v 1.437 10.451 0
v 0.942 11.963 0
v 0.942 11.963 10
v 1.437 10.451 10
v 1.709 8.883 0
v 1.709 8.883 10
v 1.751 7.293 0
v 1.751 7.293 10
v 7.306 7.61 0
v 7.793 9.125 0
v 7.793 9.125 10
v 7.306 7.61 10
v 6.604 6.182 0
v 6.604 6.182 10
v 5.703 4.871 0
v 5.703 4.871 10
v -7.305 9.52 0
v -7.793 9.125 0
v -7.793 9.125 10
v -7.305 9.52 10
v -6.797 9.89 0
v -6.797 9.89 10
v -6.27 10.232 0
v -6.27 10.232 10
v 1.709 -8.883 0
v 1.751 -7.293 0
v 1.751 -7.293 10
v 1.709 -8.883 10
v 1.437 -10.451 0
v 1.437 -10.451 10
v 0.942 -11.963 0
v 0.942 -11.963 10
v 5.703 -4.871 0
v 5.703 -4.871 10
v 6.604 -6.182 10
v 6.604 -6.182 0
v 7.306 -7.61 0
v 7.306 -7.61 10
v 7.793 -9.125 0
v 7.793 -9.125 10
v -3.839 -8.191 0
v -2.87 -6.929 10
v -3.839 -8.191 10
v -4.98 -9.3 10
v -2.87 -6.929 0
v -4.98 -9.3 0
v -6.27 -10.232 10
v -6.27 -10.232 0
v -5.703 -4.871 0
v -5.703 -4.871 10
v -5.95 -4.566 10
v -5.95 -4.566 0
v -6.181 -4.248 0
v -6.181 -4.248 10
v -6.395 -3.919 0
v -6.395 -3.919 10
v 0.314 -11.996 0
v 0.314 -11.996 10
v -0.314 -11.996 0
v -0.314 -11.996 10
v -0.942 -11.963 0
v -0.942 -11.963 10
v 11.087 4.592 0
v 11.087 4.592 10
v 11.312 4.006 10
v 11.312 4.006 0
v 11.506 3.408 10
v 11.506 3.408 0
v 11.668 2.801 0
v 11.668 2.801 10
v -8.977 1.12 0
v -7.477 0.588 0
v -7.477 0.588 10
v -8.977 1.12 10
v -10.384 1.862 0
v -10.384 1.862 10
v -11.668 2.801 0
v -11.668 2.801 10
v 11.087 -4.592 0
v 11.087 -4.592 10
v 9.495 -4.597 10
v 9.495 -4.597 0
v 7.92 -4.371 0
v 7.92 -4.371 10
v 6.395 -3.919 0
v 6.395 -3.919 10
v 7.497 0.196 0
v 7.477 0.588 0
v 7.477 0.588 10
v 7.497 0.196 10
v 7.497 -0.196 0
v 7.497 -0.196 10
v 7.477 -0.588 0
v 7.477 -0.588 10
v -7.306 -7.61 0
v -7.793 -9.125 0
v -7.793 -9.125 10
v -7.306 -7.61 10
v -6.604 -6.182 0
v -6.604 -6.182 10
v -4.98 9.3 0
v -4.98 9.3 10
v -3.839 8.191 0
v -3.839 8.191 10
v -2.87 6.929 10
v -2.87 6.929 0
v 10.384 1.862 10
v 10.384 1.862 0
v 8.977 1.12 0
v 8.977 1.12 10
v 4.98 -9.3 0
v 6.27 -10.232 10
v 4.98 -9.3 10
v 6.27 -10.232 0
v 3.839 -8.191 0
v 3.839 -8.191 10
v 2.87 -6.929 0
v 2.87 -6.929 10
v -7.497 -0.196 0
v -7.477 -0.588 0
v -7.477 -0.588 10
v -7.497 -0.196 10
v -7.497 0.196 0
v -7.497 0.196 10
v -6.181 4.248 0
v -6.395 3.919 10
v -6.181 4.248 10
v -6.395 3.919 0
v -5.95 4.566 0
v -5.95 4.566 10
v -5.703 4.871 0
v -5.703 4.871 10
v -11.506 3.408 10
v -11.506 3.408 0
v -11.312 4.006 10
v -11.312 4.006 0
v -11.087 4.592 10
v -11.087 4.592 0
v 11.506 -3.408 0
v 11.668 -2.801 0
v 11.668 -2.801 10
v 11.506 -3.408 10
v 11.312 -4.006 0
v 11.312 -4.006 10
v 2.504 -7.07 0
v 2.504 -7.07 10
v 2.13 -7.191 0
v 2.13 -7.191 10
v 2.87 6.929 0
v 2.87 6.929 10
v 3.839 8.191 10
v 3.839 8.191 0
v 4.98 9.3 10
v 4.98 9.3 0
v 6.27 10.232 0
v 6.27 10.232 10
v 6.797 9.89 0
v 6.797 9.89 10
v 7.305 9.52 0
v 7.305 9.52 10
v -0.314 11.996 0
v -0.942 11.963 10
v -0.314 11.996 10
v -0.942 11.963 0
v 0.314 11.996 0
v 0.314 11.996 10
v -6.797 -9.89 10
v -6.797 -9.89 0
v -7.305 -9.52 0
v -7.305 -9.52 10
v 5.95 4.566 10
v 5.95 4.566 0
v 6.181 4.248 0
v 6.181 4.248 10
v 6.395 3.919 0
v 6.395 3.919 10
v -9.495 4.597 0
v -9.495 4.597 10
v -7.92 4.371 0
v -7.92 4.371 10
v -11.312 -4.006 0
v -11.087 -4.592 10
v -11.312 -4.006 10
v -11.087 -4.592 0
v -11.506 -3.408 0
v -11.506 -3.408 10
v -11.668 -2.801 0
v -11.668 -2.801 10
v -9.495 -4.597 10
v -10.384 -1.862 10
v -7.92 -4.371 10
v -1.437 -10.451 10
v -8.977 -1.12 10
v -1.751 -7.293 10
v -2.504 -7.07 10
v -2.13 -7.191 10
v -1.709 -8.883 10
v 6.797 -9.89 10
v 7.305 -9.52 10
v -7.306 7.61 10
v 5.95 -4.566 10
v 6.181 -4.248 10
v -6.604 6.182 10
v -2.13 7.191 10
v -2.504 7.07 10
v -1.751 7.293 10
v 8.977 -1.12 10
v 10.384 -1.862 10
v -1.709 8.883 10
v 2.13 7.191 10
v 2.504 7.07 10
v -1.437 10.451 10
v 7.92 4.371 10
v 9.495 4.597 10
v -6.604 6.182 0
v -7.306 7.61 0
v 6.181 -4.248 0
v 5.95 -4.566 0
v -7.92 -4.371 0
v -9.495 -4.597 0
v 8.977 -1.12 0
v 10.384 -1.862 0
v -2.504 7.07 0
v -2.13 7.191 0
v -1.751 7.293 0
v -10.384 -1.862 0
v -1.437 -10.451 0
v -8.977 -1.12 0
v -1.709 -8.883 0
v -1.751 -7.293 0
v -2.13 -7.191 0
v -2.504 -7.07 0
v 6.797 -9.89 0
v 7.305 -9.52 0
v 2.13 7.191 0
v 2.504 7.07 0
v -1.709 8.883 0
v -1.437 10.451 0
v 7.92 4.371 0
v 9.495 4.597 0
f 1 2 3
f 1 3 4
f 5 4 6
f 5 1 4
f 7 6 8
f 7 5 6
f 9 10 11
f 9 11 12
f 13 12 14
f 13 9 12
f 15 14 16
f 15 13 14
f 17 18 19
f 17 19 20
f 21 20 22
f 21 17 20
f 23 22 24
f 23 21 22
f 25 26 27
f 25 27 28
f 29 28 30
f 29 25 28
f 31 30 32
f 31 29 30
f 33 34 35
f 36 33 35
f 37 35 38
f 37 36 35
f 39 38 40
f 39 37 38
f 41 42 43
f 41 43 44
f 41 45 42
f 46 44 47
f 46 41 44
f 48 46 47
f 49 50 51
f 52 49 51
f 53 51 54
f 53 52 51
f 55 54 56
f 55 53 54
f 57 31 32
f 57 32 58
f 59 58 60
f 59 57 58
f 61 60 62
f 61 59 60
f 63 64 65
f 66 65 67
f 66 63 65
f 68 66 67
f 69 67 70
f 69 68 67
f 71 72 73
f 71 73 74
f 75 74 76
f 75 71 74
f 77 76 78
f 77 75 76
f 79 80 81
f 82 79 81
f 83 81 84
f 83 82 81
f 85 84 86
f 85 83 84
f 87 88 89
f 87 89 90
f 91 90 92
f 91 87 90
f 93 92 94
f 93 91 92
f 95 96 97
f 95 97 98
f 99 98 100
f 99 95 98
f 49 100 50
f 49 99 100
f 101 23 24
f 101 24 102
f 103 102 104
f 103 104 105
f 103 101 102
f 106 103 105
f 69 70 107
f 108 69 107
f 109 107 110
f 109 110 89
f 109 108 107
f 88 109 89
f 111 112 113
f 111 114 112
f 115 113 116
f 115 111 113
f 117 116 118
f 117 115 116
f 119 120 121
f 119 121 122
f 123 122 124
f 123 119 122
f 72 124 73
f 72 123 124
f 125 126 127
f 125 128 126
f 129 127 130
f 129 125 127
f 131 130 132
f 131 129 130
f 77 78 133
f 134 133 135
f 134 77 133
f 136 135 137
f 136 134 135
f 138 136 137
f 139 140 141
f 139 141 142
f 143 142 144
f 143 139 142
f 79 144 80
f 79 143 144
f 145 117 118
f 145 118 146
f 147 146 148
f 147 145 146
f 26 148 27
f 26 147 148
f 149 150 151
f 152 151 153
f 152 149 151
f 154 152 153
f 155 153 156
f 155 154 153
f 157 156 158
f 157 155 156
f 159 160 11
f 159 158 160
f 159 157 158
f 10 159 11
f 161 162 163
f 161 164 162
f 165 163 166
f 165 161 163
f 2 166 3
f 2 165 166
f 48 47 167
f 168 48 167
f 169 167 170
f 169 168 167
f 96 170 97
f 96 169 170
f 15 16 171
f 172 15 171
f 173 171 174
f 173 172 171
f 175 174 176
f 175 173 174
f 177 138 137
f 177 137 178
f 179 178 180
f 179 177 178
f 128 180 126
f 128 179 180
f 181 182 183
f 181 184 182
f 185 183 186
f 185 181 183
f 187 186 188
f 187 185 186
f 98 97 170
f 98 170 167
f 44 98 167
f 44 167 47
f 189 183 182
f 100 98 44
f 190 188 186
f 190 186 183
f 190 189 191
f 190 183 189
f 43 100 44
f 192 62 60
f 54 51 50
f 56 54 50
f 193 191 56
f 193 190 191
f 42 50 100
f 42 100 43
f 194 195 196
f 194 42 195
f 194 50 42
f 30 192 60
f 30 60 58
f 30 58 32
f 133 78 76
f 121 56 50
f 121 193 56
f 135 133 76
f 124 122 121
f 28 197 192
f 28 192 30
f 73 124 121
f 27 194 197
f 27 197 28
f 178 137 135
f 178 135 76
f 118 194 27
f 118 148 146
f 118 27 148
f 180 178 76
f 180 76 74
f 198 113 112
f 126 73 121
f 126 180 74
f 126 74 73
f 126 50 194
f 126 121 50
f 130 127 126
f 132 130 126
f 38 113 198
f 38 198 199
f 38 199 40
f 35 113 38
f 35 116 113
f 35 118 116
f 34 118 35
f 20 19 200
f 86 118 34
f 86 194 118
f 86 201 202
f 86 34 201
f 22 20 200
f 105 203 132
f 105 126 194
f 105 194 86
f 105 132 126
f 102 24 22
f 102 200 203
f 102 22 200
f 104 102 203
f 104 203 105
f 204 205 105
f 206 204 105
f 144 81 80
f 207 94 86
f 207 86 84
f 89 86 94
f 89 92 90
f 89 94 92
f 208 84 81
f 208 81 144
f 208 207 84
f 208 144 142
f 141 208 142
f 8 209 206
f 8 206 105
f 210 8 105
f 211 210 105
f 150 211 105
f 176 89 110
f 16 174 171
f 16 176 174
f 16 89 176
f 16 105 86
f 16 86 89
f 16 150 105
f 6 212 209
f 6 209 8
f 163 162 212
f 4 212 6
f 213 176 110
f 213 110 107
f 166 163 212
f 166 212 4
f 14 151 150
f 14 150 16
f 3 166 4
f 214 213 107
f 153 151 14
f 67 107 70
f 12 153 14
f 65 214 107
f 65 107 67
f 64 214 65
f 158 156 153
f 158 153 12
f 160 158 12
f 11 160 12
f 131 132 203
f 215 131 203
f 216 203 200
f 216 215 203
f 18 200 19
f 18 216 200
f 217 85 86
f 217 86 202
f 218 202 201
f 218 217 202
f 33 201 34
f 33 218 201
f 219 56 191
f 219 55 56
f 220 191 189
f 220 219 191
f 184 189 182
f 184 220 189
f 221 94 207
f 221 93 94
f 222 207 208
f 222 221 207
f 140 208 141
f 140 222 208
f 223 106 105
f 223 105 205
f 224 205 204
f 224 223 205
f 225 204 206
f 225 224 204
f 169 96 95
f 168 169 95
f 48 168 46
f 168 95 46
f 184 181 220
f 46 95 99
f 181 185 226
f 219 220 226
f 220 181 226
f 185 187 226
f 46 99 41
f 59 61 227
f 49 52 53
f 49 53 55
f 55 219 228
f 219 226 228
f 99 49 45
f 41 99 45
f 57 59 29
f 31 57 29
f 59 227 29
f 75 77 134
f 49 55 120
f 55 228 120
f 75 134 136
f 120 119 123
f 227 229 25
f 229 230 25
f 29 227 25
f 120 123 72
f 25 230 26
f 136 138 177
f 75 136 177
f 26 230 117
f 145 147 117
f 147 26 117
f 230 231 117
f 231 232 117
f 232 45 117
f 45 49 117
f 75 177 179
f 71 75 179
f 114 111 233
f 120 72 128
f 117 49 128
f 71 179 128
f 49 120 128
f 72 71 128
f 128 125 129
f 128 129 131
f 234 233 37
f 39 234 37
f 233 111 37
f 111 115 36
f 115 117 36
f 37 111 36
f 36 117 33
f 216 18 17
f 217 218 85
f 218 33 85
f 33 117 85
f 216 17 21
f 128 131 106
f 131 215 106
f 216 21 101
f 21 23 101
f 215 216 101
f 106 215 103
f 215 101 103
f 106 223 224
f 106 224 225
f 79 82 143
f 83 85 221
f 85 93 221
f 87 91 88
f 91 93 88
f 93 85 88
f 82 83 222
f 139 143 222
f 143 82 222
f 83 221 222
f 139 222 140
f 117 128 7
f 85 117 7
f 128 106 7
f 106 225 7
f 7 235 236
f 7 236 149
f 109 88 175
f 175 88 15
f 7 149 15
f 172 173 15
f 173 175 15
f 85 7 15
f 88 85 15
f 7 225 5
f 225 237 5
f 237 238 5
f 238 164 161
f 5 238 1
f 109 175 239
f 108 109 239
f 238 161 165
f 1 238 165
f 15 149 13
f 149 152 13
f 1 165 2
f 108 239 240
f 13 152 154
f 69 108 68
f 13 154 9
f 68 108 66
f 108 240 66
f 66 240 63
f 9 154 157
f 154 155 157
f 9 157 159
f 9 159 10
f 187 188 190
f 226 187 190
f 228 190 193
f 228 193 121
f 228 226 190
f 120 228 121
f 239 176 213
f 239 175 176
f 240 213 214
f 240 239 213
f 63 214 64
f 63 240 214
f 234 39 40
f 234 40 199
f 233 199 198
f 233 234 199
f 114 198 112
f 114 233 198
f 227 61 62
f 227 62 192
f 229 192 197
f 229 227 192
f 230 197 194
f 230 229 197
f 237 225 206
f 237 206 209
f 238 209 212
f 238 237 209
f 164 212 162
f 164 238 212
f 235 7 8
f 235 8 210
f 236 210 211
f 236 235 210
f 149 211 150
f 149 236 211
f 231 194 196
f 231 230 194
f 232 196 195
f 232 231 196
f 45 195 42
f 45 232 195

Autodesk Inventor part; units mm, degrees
sketch "Sketch1" plane through (0, 0, 0) normal (0, 0, 1) x (1, 0, 0)
  circle A0 centre (0, 0) radius 12
  dimension "d0" = 24
extrude "Extrusion1" add sketch "Sketch1" along normal blind 10
ref_plane "Work Plane2" through (0, 0, 5) normal (0, 0, 1) x (1, 0, 0)
sketch "Sketch2" plane through (0, 0, 0) normal (0, 0, -1) x (-1, 0, 0)
  circle A0 centre (0, 0) radius 12 projected
  circle A1 centre (0, 0) radius 10
  dimension "d3" = 20
surface extrude "Pitch Diameter" sketch "Sketch2" against normal through all shown no curves A1
ref_plane "Work Plane8" through (0, 0, 0) normal (0.9510565, 0.309017, 0) x (0, 0, 1)
ref_plane "Work Plane9" through (0, 0, 0) normal (1, 0, 0) x (0, 1, 0)
spur gear teeth "Spur Gear" teeth 10 pitch diameter 20 tip diameter 24 root diameter 15 face width 10 start plane through (0, 0, 0) normal (0, 0, -1) x (-1, 0, 0)
equation "\"d0\" = da_da"
equation "\"d1\" = da_b"
equation "\"d3\" = da_d"
equation "\"da_da\" = 24"
equation "\"da_b\" = 10"
equation "\"da_d\" = 20"
properties part number "Spur Gear1" material "Steel"
